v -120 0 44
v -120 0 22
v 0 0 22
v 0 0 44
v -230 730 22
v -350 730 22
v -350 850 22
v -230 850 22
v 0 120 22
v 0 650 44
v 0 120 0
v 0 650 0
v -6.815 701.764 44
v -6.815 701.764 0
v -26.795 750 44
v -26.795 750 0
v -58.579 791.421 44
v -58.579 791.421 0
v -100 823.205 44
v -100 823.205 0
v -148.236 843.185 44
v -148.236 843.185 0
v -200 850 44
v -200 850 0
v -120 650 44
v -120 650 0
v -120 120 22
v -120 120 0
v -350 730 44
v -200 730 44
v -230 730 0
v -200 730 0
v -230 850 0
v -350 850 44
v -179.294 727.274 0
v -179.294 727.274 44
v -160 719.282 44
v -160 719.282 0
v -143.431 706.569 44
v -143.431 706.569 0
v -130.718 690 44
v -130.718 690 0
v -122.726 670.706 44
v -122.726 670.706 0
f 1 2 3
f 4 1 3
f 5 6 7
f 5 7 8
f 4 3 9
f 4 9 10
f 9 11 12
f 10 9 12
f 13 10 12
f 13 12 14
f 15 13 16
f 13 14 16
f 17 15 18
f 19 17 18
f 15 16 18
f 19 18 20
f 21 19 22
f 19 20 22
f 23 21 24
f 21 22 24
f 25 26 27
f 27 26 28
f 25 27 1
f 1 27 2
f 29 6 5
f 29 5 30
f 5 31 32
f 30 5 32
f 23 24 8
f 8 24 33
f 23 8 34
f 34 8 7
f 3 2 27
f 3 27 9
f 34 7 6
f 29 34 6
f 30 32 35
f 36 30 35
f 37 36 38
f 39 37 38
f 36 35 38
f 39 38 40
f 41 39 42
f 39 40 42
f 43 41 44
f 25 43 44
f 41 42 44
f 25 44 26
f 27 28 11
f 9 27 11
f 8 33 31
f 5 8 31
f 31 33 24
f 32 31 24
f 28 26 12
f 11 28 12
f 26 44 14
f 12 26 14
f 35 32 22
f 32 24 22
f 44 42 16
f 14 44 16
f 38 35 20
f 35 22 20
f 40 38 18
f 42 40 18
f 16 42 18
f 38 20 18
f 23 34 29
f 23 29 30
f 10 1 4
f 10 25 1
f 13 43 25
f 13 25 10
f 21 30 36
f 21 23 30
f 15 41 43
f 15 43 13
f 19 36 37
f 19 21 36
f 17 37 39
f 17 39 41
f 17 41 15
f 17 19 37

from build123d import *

# Parameters (mm, degrees)
F1_DEPTH = 44
F2_W     = 120
F2_H     = 120
F3_DEPTH = 22
F4_W     = 120
F4_H     = 120
F5_DEPTH = 22


with BuildPart() as f1:
    # F0 (on Top) → F1 (new body)
    with BuildSketch(Plane.XY):
        with BuildLine():
            Line((-120, 0), (0, 0))
            Line((0, 0), (0, 650))
            ThreePointArc((0, 650), (-58.578644, 791.421356), (-200, 850))
            Line((-200, 850), (-350, 850))
            Line((-350, 850), (-350, 730))
            Line((-350, 730), (-200, 730))
            ThreePointArc((-200, 730), (-143.431458, 706.568542), (-120, 650))
            Line((-120, 650), (-120, 0))
        make_face()
    extrude(amount=F1_DEPTH)

    # F2 (on face) → F3 (cut)
    with BuildSketch(Plane(origin=(0, 0, 0), x_dir=(1, 0, 0), z_dir=(0, 0, -1))):
        with Locations((-60, -60)):
            Rectangle(F2_W, F2_H)
    extrude(amount=-F3_DEPTH, mode=Mode.SUBTRACT)

    # F4 (on face) → F5 (cut)
    with BuildSketch(Plane(origin=(0, 0, 0), x_dir=(1, 0, 0), z_dir=(0, 0, -1))):
        with Locations((-290, -790)):
            Rectangle(F4_W, F4_H)
    extrude(amount=-F5_DEPTH, mode=Mode.SUBTRACT)


solid = f1.part
